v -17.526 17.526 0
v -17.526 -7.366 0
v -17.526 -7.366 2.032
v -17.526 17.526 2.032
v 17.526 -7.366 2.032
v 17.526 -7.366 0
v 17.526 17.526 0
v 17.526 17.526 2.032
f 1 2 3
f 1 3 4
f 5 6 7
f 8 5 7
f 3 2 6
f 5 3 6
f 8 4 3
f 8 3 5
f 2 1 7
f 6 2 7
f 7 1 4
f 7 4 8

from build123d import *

# Parameters (mm, degrees)
F0_W     = 37.592
F0_H     = 37.592
F1_DEPTH = 2.032
F2_DEPTH = 1.27
F3_DEPTH = 1.27
F4_DEPTH = 10.16


with BuildPart() as f1:
    # F0 (on Top) → F1 (new body)
    with BuildSketch(Plane.XY):
        Rectangle(F0_W, F0_H)
    extrude(amount=F1_DEPTH)

    # F2 (cut, symmetric): faces of the model
    f2_faces = [f1.faces().sort_by_distance(p)[0] for p in [
        (0, -18.796, 1.016),
        (0, 18.796, 1.016),
    ]]
    extrude(f2_faces, amount=F2_DEPTH, both=True, dir=(0, -1, 0), mode=Mode.SUBTRACT)

    # F3 (cut, symmetric): faces of the model
    f3_faces = [f1.faces().sort_by_distance(p)[0] for p in [
        (18.796, 0, 1.016),
        (-18.796, 0, 1.016),
    ]]
    extrude(f3_faces, amount=F3_DEPTH, both=True, dir=(1, 0, 0), mode=Mode.SUBTRACT)

    # F4 (cut): a face of the model
    f4_faces = [f1.faces().sort_by_distance(p)[0] for p in [
        (0, -17.526, 1.016),
    ]]
    extrude(f4_faces, amount=-F4_DEPTH, mode=Mode.SUBTRACT)


solid = f1.part
